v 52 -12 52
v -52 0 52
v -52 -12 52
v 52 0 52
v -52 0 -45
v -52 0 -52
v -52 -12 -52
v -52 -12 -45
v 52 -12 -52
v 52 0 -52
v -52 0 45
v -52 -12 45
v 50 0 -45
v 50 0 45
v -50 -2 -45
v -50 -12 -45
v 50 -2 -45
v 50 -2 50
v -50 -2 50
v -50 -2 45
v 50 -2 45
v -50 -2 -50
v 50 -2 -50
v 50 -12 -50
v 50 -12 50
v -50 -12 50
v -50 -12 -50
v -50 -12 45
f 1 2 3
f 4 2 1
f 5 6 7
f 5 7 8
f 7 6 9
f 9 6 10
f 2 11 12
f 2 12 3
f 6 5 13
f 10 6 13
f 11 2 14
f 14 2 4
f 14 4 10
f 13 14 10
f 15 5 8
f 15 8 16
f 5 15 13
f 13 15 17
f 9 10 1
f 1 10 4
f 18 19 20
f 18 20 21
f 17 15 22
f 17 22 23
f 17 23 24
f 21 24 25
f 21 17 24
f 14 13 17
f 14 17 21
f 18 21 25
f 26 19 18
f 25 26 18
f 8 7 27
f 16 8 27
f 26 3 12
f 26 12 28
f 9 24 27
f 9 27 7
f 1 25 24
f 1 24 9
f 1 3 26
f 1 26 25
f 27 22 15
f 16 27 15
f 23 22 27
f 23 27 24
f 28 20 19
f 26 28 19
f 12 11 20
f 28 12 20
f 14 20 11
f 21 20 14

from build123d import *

# Parameters (mm, degrees)
F0_W      = 104
F0_H      = 104
F1_DEPTH  = 2
F2_T      = -2
F3_W      = 104
F3_H      = 2
F4_DEPTH  = 10
F5_W      = 104
F5_H      = 2
F6_DEPTH  = 10
F7_W      = 2
F7_H      = 100
F8_DEPTH  = 10
F9_W      = 2
F9_H      = 100
F10_DEPTH = 10
F13_W     = 111.434492
F13_H     = 90
F14_DEPTH = 25
F15_W     = 15.078314
F15_H     = 90
F16_DEPTH = 25


with BuildPart() as f1:
    # F0 (on Front) → F1 (new body)
    with BuildSketch(Plane.XZ):
        Rectangle(F0_W, F0_H)
    extrude(amount=F1_DEPTH)

    # F2
    f2_openings = [f1.faces().sort_by_distance(p)[0] for p in [
        (0, -2, 0),
    ]]
    offset(amount=F2_T, openings=f2_openings)

    # F3 (on face) → F4 (join)
    with BuildSketch(Plane.XZ.offset(2)):
        with Locations((0, 51)):
            Rectangle(F3_W, F3_H)
    extrude(amount=F4_DEPTH)

    # F5 (on face) → F6 (join)
    with BuildSketch(Plane.XZ.offset(2)):
        with Locations((0, -51)):
            Rectangle(F5_W, F5_H)
    extrude(amount=F6_DEPTH)

    # F7 (on face) → F8 (join)
    with BuildSketch(Plane.XZ.offset(2)):
        with Locations((-51, 0)):
            Rectangle(F7_W, F7_H)
    extrude(amount=F8_DEPTH)

    # F9 (on face) → F10 (join)
    with BuildSketch(Plane.XZ.offset(2)):
        with Locations((51, 0)):
            Rectangle(F9_W, F9_H)
    extrude(amount=F10_DEPTH)

    # F13 (on face) → F14 (cut)
    with BuildSketch(Plane.XZ.offset(2)):
        with Locations((-5.717246, 0)):
            Rectangle(F13_W, F13_H)
    extrude(amount=-F14_DEPTH, mode=Mode.SUBTRACT)

    # F15 (on face) → F16 (cut)
    with BuildSketch(Plane(origin=(-52, 0, 0), x_dir=(0, -1, 0), z_dir=(-1, 0, 0))):
        with Locations((9.539157, 0)):
            Rectangle(F15_W, F15_H)
    extrude(amount=-F16_DEPTH, mode=Mode.SUBTRACT)


solid = f1.part
